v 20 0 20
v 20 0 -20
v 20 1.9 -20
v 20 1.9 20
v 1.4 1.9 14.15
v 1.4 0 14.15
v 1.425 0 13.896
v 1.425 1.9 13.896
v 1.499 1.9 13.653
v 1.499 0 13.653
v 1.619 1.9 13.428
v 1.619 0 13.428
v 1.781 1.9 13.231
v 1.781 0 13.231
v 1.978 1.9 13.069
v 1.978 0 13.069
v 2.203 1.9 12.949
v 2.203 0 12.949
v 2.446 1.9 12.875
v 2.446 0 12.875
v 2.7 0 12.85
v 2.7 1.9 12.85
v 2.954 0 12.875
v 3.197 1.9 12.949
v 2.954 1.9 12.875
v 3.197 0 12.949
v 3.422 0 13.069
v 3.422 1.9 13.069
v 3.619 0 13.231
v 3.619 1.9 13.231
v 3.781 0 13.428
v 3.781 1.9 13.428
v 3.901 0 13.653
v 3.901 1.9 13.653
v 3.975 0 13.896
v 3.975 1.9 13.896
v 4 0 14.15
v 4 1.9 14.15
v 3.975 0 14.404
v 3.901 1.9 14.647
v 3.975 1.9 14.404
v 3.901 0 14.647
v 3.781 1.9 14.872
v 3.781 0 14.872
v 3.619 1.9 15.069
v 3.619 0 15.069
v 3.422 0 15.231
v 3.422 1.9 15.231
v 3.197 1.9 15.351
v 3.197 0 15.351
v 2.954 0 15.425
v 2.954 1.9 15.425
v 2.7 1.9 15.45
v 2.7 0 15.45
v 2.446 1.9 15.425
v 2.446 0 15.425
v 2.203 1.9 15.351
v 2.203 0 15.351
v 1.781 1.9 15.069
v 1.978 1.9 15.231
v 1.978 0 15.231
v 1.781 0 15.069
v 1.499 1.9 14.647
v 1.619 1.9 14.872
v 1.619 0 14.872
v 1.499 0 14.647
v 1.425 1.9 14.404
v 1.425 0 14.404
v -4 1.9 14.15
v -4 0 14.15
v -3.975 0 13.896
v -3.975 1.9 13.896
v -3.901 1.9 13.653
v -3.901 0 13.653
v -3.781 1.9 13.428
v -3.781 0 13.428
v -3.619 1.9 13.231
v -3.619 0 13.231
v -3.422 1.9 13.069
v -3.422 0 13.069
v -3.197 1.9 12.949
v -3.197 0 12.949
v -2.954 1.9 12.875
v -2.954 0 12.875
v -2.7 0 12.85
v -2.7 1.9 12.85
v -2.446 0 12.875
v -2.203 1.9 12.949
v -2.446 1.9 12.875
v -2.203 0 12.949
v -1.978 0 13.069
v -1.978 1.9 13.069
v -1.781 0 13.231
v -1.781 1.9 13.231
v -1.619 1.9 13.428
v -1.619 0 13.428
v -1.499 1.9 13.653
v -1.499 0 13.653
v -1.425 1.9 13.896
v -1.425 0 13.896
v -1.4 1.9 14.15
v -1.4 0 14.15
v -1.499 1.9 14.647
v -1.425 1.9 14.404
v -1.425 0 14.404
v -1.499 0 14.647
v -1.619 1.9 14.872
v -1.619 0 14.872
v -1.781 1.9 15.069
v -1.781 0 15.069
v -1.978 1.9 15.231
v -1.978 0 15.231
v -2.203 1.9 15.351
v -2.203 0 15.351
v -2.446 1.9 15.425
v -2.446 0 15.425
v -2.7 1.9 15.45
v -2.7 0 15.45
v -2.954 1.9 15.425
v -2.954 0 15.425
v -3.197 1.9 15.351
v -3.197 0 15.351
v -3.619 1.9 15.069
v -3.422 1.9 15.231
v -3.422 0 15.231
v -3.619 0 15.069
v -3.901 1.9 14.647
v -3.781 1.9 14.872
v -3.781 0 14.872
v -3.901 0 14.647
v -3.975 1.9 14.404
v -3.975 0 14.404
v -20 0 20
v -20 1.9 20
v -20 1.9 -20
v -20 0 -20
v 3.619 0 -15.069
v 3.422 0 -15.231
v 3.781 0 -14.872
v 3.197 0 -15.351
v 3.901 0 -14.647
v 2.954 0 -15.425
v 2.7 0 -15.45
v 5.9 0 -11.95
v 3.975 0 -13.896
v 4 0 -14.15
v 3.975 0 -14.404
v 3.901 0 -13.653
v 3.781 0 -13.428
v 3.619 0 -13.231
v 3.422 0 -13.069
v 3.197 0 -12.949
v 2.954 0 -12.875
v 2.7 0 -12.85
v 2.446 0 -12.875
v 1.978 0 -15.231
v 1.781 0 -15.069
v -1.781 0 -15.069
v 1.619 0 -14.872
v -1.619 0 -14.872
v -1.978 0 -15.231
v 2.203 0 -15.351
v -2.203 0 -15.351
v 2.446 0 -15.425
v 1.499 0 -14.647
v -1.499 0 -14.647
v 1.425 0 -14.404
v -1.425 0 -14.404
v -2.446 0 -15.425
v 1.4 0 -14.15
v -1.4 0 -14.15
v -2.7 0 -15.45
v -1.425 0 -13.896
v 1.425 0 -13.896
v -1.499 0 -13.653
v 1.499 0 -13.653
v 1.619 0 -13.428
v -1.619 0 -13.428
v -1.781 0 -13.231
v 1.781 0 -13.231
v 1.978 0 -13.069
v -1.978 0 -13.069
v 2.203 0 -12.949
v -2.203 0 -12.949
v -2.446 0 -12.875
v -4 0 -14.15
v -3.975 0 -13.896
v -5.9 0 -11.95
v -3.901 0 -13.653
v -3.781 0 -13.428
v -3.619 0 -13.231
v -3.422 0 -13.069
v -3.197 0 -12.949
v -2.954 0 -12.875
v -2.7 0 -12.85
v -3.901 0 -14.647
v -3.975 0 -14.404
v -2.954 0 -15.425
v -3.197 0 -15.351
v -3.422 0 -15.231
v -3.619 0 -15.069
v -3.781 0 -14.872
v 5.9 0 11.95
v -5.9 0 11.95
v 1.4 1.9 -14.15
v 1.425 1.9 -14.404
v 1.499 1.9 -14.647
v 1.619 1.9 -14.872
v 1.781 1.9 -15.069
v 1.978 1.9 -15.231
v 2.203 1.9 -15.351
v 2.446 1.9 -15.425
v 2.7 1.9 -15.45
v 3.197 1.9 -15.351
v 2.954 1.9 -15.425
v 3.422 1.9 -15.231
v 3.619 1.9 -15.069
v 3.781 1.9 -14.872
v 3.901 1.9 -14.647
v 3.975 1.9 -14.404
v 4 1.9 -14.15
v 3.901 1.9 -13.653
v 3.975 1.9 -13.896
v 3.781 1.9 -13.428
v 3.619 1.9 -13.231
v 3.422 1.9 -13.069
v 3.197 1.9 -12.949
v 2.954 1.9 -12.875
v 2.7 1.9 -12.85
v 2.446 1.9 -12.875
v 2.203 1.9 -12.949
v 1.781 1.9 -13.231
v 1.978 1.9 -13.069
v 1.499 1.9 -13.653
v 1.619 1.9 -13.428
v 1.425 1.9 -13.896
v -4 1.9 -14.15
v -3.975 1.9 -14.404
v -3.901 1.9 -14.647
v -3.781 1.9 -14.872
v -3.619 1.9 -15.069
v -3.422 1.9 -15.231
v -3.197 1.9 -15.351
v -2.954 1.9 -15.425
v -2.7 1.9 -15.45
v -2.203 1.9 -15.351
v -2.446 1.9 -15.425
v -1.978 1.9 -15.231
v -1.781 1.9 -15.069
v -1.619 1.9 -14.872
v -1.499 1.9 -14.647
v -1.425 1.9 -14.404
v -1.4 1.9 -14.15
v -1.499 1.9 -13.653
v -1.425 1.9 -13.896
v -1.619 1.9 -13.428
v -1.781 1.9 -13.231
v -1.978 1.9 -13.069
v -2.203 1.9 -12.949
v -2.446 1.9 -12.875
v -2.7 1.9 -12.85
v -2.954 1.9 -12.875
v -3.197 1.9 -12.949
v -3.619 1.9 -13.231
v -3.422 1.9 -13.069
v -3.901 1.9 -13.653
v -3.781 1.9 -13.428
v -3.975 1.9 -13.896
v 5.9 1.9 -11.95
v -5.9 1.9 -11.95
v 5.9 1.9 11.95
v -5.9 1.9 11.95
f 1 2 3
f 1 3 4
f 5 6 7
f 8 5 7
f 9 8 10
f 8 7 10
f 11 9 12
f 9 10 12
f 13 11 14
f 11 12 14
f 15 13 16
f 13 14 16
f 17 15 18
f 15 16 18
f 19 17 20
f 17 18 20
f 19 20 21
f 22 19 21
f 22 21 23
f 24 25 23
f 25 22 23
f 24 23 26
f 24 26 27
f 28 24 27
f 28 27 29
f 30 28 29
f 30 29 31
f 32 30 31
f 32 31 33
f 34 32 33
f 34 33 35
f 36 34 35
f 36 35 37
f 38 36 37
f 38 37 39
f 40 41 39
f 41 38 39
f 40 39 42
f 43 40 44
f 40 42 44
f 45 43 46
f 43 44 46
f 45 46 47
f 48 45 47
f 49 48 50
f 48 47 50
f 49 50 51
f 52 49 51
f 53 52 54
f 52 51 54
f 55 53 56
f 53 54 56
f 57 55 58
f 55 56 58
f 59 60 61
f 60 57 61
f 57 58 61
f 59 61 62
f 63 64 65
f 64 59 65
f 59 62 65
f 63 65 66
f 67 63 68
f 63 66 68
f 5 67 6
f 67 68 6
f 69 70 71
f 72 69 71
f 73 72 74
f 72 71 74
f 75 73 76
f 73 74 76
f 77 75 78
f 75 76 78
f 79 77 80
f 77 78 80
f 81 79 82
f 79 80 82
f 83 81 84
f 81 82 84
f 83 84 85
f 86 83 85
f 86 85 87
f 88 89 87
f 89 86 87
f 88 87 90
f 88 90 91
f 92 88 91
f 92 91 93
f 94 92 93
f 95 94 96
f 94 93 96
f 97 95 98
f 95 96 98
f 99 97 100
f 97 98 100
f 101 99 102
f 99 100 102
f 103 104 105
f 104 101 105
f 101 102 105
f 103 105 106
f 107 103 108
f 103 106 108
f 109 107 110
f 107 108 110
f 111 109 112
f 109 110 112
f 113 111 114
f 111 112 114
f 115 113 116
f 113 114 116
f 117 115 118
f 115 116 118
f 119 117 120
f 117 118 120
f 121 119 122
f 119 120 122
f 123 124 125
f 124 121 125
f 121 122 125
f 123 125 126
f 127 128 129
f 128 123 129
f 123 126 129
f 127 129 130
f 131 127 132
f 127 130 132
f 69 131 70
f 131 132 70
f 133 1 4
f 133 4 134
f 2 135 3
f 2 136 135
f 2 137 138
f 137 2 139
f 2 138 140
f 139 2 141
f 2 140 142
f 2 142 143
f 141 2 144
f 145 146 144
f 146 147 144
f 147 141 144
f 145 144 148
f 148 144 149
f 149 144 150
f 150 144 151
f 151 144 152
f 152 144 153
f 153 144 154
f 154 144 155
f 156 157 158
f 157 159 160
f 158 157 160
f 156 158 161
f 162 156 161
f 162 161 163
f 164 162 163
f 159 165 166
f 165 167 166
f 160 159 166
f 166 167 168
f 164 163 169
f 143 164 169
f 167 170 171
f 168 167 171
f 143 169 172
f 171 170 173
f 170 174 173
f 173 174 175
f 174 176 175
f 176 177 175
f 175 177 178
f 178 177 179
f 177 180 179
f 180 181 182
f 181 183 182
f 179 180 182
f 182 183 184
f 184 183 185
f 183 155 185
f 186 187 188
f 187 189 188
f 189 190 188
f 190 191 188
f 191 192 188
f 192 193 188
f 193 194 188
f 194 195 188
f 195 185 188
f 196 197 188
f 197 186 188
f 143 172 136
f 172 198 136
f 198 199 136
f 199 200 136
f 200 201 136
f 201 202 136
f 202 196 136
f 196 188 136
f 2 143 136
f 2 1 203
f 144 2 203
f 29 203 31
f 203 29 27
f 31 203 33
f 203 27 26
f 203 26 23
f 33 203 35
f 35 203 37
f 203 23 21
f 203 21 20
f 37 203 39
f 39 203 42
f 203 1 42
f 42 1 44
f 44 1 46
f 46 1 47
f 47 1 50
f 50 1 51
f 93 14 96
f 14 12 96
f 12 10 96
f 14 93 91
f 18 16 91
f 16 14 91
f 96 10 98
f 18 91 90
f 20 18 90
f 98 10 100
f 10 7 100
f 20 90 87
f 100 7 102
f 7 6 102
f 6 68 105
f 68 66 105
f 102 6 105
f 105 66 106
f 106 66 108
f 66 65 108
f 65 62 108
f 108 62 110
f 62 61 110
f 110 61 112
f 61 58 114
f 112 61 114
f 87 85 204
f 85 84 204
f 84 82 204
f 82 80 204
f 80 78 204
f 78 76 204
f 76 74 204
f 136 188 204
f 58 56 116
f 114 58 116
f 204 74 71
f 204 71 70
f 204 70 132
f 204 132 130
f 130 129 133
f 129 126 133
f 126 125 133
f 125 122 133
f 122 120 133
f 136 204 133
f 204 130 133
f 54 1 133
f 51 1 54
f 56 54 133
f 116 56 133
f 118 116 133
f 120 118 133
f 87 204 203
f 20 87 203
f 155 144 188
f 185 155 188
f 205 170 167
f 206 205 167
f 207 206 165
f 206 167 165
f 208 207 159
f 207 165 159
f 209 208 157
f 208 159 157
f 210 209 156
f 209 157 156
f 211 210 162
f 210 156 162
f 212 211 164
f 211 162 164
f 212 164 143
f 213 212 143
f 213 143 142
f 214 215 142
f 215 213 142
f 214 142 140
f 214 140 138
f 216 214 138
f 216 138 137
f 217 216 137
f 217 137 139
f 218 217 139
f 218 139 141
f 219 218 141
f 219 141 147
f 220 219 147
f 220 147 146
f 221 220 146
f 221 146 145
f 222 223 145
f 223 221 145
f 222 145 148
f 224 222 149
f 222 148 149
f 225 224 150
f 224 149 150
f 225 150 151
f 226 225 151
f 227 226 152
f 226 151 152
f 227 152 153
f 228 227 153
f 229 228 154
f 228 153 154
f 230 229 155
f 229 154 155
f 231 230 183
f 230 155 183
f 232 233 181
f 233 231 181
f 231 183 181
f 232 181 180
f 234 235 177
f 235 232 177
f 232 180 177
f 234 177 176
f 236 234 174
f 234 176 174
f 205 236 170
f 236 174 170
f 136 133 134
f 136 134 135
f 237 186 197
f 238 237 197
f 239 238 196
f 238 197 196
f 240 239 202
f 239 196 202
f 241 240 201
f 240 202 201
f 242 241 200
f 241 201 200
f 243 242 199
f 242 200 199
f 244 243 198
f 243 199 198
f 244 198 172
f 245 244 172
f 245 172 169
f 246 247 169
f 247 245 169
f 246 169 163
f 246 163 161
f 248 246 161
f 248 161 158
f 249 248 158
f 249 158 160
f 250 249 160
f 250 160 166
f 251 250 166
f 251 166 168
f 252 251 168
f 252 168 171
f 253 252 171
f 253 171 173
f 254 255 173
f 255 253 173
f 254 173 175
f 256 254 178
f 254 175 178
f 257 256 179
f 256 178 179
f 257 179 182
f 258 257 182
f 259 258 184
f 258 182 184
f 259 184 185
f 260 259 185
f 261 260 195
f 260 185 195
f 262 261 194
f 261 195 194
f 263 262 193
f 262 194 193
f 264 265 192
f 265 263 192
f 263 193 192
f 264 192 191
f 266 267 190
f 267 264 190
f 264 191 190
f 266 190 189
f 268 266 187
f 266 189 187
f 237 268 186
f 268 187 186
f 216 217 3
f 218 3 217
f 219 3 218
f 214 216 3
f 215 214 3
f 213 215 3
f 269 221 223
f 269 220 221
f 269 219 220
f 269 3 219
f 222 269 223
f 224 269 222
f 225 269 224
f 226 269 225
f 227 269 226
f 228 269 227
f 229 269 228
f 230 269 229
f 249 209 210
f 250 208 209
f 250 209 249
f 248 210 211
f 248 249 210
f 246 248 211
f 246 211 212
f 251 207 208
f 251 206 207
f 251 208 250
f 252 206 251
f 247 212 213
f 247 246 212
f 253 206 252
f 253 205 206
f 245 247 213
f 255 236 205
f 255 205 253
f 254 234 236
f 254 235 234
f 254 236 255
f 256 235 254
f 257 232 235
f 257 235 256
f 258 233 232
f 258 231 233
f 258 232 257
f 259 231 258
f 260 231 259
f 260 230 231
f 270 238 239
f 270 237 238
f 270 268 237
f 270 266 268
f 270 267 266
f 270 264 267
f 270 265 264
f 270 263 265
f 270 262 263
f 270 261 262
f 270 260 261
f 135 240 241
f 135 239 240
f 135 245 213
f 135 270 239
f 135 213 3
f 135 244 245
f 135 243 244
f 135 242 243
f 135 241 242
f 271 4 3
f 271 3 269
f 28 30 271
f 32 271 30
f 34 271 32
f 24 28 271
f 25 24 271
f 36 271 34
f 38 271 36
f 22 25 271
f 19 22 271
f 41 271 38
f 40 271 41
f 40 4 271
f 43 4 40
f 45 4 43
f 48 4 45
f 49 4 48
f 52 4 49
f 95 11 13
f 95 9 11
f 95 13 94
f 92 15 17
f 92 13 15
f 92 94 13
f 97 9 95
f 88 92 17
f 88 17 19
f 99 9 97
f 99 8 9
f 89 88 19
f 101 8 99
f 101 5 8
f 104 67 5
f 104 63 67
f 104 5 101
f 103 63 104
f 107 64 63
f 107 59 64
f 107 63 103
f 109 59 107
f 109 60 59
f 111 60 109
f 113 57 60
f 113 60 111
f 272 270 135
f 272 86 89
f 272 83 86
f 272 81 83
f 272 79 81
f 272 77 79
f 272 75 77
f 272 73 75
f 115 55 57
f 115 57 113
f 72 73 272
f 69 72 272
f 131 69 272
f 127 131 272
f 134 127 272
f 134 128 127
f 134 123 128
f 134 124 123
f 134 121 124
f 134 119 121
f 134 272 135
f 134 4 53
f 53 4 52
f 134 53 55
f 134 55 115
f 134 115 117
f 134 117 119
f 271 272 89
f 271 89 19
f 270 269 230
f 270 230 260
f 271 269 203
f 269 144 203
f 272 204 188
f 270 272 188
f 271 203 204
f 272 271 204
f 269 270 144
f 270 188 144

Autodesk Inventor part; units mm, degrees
ref_plane "YZ Plane" through (0, 0, 0) normal (1, 0, 0) x (0, 1, 0)
ref_plane "XZ Plane" through (0, 0, 0) normal (0, 1, 0) x (-1, 0, 0)
ref_plane "XY Plane" through (0, 0, 0) normal (0, 0, 1) x (1, 0, 0)
sketch "Sketch1" plane through (0, 0, 0) normal (0, 1, 0) x (-1, 0, 0)
  line L0 (-5.7, 11.75) -> (5.7, 11.75) construction
  line L1 (5.7, 11.75) -> (5.7, -11.75) construction
  line L2 (5.7, -11.75) -> (-5.7, -11.75) construction
  line L3 (-5.7, -11.75) -> (-5.7, 11.75) construction
  line L4 (0, 15.7993) -> (0, -16.2311) construction
  line L5 (0, 0) -> (13.9659, 0) construction
  line L6 (-5.7, 16.15) -> (5.7, 16.15) construction
  line L7 (5.7, 16.15) -> (5.7, -16.15) construction
  line L8 (5.7, -16.15) -> (-5.7, -16.15) construction
  line L9 (-5.7, -16.15) -> (-5.7, 16.15) construction
  circle A0 centre (-2.7, 14.15) radius 1.3
  line L10 (0, 0) -> (-13.9659, 0) construction
  circle A1 centre (2.7, 14.15) radius 1.3
  circle A2 centre (-2.7, -14.15) radius 1.3
  circle A3 centre (2.7, -14.15) radius 1.3
  line L11 (-20, 20) -> (20, 20)
  line L12 (20, 20) -> (20, -20)
  line L13 (20, -20) -> (-20, -20)
  line L14 (-20, -20) -> (-20, 20)
  line L15 (0, 0) -> (0, 9.3177) construction
  line L16 (-5.9, 11.95) -> (5.9, 11.95)
  line L17 (5.9, 11.95) -> (5.9, -11.95)
  line L18 (5.9, -11.95) -> (-5.9, -11.95)
  line L19 (-5.9, -11.95) -> (-5.9, 11.95)
  dimension "d1" = 3
  dimension "d2" = 4.4
  dimension "d4" = 23.5
  dimension "d5" = 11.4
  dimension "d6" = 2.6
  dimension "d7" = 40
  dimension "d10" = 0.2
  dimension "d11" = 0.2
  dimension "d14" = 2.4
extrude "Extrusion2" add sketch "Sketch1" along normal blind 1.9
equation "\"d1\" = ServoEdgeToFixation"
equation "\"d2\" = ServoFixationLength"
equation "\"d4\" = ServoCoreLength"
equation "\"d5\" = ServoCoreWidth"
equation "\"d6\" = ServoScrewDiameterRequired"
equation "\"d10\" = ServoTraceSpacing"
equation "\"d11\" = ServoTraceSpacing"
equation "\"d14\" = ServoCoreToFixation"
equation "\"d12\" = ServoArmThickness"
equation "\"ServoTraceSpacing\" = 0.2"
equation "\"ServoEdgeToFixation\" = 3"
equation "\"ServoFixationLength\" = 4.4"
equation "\"ServoCoreLength\" = 23.5"
equation "\"ServoCoreWidth\" = 11.4"
equation "\"ServoScrewDiameterRequired\" = 2.6"
equation "\"ServoCoreToFixation\" = 2.4"
equation "\"ServoArmThickness\" = 1.9"
properties part number "ServoTrace"
